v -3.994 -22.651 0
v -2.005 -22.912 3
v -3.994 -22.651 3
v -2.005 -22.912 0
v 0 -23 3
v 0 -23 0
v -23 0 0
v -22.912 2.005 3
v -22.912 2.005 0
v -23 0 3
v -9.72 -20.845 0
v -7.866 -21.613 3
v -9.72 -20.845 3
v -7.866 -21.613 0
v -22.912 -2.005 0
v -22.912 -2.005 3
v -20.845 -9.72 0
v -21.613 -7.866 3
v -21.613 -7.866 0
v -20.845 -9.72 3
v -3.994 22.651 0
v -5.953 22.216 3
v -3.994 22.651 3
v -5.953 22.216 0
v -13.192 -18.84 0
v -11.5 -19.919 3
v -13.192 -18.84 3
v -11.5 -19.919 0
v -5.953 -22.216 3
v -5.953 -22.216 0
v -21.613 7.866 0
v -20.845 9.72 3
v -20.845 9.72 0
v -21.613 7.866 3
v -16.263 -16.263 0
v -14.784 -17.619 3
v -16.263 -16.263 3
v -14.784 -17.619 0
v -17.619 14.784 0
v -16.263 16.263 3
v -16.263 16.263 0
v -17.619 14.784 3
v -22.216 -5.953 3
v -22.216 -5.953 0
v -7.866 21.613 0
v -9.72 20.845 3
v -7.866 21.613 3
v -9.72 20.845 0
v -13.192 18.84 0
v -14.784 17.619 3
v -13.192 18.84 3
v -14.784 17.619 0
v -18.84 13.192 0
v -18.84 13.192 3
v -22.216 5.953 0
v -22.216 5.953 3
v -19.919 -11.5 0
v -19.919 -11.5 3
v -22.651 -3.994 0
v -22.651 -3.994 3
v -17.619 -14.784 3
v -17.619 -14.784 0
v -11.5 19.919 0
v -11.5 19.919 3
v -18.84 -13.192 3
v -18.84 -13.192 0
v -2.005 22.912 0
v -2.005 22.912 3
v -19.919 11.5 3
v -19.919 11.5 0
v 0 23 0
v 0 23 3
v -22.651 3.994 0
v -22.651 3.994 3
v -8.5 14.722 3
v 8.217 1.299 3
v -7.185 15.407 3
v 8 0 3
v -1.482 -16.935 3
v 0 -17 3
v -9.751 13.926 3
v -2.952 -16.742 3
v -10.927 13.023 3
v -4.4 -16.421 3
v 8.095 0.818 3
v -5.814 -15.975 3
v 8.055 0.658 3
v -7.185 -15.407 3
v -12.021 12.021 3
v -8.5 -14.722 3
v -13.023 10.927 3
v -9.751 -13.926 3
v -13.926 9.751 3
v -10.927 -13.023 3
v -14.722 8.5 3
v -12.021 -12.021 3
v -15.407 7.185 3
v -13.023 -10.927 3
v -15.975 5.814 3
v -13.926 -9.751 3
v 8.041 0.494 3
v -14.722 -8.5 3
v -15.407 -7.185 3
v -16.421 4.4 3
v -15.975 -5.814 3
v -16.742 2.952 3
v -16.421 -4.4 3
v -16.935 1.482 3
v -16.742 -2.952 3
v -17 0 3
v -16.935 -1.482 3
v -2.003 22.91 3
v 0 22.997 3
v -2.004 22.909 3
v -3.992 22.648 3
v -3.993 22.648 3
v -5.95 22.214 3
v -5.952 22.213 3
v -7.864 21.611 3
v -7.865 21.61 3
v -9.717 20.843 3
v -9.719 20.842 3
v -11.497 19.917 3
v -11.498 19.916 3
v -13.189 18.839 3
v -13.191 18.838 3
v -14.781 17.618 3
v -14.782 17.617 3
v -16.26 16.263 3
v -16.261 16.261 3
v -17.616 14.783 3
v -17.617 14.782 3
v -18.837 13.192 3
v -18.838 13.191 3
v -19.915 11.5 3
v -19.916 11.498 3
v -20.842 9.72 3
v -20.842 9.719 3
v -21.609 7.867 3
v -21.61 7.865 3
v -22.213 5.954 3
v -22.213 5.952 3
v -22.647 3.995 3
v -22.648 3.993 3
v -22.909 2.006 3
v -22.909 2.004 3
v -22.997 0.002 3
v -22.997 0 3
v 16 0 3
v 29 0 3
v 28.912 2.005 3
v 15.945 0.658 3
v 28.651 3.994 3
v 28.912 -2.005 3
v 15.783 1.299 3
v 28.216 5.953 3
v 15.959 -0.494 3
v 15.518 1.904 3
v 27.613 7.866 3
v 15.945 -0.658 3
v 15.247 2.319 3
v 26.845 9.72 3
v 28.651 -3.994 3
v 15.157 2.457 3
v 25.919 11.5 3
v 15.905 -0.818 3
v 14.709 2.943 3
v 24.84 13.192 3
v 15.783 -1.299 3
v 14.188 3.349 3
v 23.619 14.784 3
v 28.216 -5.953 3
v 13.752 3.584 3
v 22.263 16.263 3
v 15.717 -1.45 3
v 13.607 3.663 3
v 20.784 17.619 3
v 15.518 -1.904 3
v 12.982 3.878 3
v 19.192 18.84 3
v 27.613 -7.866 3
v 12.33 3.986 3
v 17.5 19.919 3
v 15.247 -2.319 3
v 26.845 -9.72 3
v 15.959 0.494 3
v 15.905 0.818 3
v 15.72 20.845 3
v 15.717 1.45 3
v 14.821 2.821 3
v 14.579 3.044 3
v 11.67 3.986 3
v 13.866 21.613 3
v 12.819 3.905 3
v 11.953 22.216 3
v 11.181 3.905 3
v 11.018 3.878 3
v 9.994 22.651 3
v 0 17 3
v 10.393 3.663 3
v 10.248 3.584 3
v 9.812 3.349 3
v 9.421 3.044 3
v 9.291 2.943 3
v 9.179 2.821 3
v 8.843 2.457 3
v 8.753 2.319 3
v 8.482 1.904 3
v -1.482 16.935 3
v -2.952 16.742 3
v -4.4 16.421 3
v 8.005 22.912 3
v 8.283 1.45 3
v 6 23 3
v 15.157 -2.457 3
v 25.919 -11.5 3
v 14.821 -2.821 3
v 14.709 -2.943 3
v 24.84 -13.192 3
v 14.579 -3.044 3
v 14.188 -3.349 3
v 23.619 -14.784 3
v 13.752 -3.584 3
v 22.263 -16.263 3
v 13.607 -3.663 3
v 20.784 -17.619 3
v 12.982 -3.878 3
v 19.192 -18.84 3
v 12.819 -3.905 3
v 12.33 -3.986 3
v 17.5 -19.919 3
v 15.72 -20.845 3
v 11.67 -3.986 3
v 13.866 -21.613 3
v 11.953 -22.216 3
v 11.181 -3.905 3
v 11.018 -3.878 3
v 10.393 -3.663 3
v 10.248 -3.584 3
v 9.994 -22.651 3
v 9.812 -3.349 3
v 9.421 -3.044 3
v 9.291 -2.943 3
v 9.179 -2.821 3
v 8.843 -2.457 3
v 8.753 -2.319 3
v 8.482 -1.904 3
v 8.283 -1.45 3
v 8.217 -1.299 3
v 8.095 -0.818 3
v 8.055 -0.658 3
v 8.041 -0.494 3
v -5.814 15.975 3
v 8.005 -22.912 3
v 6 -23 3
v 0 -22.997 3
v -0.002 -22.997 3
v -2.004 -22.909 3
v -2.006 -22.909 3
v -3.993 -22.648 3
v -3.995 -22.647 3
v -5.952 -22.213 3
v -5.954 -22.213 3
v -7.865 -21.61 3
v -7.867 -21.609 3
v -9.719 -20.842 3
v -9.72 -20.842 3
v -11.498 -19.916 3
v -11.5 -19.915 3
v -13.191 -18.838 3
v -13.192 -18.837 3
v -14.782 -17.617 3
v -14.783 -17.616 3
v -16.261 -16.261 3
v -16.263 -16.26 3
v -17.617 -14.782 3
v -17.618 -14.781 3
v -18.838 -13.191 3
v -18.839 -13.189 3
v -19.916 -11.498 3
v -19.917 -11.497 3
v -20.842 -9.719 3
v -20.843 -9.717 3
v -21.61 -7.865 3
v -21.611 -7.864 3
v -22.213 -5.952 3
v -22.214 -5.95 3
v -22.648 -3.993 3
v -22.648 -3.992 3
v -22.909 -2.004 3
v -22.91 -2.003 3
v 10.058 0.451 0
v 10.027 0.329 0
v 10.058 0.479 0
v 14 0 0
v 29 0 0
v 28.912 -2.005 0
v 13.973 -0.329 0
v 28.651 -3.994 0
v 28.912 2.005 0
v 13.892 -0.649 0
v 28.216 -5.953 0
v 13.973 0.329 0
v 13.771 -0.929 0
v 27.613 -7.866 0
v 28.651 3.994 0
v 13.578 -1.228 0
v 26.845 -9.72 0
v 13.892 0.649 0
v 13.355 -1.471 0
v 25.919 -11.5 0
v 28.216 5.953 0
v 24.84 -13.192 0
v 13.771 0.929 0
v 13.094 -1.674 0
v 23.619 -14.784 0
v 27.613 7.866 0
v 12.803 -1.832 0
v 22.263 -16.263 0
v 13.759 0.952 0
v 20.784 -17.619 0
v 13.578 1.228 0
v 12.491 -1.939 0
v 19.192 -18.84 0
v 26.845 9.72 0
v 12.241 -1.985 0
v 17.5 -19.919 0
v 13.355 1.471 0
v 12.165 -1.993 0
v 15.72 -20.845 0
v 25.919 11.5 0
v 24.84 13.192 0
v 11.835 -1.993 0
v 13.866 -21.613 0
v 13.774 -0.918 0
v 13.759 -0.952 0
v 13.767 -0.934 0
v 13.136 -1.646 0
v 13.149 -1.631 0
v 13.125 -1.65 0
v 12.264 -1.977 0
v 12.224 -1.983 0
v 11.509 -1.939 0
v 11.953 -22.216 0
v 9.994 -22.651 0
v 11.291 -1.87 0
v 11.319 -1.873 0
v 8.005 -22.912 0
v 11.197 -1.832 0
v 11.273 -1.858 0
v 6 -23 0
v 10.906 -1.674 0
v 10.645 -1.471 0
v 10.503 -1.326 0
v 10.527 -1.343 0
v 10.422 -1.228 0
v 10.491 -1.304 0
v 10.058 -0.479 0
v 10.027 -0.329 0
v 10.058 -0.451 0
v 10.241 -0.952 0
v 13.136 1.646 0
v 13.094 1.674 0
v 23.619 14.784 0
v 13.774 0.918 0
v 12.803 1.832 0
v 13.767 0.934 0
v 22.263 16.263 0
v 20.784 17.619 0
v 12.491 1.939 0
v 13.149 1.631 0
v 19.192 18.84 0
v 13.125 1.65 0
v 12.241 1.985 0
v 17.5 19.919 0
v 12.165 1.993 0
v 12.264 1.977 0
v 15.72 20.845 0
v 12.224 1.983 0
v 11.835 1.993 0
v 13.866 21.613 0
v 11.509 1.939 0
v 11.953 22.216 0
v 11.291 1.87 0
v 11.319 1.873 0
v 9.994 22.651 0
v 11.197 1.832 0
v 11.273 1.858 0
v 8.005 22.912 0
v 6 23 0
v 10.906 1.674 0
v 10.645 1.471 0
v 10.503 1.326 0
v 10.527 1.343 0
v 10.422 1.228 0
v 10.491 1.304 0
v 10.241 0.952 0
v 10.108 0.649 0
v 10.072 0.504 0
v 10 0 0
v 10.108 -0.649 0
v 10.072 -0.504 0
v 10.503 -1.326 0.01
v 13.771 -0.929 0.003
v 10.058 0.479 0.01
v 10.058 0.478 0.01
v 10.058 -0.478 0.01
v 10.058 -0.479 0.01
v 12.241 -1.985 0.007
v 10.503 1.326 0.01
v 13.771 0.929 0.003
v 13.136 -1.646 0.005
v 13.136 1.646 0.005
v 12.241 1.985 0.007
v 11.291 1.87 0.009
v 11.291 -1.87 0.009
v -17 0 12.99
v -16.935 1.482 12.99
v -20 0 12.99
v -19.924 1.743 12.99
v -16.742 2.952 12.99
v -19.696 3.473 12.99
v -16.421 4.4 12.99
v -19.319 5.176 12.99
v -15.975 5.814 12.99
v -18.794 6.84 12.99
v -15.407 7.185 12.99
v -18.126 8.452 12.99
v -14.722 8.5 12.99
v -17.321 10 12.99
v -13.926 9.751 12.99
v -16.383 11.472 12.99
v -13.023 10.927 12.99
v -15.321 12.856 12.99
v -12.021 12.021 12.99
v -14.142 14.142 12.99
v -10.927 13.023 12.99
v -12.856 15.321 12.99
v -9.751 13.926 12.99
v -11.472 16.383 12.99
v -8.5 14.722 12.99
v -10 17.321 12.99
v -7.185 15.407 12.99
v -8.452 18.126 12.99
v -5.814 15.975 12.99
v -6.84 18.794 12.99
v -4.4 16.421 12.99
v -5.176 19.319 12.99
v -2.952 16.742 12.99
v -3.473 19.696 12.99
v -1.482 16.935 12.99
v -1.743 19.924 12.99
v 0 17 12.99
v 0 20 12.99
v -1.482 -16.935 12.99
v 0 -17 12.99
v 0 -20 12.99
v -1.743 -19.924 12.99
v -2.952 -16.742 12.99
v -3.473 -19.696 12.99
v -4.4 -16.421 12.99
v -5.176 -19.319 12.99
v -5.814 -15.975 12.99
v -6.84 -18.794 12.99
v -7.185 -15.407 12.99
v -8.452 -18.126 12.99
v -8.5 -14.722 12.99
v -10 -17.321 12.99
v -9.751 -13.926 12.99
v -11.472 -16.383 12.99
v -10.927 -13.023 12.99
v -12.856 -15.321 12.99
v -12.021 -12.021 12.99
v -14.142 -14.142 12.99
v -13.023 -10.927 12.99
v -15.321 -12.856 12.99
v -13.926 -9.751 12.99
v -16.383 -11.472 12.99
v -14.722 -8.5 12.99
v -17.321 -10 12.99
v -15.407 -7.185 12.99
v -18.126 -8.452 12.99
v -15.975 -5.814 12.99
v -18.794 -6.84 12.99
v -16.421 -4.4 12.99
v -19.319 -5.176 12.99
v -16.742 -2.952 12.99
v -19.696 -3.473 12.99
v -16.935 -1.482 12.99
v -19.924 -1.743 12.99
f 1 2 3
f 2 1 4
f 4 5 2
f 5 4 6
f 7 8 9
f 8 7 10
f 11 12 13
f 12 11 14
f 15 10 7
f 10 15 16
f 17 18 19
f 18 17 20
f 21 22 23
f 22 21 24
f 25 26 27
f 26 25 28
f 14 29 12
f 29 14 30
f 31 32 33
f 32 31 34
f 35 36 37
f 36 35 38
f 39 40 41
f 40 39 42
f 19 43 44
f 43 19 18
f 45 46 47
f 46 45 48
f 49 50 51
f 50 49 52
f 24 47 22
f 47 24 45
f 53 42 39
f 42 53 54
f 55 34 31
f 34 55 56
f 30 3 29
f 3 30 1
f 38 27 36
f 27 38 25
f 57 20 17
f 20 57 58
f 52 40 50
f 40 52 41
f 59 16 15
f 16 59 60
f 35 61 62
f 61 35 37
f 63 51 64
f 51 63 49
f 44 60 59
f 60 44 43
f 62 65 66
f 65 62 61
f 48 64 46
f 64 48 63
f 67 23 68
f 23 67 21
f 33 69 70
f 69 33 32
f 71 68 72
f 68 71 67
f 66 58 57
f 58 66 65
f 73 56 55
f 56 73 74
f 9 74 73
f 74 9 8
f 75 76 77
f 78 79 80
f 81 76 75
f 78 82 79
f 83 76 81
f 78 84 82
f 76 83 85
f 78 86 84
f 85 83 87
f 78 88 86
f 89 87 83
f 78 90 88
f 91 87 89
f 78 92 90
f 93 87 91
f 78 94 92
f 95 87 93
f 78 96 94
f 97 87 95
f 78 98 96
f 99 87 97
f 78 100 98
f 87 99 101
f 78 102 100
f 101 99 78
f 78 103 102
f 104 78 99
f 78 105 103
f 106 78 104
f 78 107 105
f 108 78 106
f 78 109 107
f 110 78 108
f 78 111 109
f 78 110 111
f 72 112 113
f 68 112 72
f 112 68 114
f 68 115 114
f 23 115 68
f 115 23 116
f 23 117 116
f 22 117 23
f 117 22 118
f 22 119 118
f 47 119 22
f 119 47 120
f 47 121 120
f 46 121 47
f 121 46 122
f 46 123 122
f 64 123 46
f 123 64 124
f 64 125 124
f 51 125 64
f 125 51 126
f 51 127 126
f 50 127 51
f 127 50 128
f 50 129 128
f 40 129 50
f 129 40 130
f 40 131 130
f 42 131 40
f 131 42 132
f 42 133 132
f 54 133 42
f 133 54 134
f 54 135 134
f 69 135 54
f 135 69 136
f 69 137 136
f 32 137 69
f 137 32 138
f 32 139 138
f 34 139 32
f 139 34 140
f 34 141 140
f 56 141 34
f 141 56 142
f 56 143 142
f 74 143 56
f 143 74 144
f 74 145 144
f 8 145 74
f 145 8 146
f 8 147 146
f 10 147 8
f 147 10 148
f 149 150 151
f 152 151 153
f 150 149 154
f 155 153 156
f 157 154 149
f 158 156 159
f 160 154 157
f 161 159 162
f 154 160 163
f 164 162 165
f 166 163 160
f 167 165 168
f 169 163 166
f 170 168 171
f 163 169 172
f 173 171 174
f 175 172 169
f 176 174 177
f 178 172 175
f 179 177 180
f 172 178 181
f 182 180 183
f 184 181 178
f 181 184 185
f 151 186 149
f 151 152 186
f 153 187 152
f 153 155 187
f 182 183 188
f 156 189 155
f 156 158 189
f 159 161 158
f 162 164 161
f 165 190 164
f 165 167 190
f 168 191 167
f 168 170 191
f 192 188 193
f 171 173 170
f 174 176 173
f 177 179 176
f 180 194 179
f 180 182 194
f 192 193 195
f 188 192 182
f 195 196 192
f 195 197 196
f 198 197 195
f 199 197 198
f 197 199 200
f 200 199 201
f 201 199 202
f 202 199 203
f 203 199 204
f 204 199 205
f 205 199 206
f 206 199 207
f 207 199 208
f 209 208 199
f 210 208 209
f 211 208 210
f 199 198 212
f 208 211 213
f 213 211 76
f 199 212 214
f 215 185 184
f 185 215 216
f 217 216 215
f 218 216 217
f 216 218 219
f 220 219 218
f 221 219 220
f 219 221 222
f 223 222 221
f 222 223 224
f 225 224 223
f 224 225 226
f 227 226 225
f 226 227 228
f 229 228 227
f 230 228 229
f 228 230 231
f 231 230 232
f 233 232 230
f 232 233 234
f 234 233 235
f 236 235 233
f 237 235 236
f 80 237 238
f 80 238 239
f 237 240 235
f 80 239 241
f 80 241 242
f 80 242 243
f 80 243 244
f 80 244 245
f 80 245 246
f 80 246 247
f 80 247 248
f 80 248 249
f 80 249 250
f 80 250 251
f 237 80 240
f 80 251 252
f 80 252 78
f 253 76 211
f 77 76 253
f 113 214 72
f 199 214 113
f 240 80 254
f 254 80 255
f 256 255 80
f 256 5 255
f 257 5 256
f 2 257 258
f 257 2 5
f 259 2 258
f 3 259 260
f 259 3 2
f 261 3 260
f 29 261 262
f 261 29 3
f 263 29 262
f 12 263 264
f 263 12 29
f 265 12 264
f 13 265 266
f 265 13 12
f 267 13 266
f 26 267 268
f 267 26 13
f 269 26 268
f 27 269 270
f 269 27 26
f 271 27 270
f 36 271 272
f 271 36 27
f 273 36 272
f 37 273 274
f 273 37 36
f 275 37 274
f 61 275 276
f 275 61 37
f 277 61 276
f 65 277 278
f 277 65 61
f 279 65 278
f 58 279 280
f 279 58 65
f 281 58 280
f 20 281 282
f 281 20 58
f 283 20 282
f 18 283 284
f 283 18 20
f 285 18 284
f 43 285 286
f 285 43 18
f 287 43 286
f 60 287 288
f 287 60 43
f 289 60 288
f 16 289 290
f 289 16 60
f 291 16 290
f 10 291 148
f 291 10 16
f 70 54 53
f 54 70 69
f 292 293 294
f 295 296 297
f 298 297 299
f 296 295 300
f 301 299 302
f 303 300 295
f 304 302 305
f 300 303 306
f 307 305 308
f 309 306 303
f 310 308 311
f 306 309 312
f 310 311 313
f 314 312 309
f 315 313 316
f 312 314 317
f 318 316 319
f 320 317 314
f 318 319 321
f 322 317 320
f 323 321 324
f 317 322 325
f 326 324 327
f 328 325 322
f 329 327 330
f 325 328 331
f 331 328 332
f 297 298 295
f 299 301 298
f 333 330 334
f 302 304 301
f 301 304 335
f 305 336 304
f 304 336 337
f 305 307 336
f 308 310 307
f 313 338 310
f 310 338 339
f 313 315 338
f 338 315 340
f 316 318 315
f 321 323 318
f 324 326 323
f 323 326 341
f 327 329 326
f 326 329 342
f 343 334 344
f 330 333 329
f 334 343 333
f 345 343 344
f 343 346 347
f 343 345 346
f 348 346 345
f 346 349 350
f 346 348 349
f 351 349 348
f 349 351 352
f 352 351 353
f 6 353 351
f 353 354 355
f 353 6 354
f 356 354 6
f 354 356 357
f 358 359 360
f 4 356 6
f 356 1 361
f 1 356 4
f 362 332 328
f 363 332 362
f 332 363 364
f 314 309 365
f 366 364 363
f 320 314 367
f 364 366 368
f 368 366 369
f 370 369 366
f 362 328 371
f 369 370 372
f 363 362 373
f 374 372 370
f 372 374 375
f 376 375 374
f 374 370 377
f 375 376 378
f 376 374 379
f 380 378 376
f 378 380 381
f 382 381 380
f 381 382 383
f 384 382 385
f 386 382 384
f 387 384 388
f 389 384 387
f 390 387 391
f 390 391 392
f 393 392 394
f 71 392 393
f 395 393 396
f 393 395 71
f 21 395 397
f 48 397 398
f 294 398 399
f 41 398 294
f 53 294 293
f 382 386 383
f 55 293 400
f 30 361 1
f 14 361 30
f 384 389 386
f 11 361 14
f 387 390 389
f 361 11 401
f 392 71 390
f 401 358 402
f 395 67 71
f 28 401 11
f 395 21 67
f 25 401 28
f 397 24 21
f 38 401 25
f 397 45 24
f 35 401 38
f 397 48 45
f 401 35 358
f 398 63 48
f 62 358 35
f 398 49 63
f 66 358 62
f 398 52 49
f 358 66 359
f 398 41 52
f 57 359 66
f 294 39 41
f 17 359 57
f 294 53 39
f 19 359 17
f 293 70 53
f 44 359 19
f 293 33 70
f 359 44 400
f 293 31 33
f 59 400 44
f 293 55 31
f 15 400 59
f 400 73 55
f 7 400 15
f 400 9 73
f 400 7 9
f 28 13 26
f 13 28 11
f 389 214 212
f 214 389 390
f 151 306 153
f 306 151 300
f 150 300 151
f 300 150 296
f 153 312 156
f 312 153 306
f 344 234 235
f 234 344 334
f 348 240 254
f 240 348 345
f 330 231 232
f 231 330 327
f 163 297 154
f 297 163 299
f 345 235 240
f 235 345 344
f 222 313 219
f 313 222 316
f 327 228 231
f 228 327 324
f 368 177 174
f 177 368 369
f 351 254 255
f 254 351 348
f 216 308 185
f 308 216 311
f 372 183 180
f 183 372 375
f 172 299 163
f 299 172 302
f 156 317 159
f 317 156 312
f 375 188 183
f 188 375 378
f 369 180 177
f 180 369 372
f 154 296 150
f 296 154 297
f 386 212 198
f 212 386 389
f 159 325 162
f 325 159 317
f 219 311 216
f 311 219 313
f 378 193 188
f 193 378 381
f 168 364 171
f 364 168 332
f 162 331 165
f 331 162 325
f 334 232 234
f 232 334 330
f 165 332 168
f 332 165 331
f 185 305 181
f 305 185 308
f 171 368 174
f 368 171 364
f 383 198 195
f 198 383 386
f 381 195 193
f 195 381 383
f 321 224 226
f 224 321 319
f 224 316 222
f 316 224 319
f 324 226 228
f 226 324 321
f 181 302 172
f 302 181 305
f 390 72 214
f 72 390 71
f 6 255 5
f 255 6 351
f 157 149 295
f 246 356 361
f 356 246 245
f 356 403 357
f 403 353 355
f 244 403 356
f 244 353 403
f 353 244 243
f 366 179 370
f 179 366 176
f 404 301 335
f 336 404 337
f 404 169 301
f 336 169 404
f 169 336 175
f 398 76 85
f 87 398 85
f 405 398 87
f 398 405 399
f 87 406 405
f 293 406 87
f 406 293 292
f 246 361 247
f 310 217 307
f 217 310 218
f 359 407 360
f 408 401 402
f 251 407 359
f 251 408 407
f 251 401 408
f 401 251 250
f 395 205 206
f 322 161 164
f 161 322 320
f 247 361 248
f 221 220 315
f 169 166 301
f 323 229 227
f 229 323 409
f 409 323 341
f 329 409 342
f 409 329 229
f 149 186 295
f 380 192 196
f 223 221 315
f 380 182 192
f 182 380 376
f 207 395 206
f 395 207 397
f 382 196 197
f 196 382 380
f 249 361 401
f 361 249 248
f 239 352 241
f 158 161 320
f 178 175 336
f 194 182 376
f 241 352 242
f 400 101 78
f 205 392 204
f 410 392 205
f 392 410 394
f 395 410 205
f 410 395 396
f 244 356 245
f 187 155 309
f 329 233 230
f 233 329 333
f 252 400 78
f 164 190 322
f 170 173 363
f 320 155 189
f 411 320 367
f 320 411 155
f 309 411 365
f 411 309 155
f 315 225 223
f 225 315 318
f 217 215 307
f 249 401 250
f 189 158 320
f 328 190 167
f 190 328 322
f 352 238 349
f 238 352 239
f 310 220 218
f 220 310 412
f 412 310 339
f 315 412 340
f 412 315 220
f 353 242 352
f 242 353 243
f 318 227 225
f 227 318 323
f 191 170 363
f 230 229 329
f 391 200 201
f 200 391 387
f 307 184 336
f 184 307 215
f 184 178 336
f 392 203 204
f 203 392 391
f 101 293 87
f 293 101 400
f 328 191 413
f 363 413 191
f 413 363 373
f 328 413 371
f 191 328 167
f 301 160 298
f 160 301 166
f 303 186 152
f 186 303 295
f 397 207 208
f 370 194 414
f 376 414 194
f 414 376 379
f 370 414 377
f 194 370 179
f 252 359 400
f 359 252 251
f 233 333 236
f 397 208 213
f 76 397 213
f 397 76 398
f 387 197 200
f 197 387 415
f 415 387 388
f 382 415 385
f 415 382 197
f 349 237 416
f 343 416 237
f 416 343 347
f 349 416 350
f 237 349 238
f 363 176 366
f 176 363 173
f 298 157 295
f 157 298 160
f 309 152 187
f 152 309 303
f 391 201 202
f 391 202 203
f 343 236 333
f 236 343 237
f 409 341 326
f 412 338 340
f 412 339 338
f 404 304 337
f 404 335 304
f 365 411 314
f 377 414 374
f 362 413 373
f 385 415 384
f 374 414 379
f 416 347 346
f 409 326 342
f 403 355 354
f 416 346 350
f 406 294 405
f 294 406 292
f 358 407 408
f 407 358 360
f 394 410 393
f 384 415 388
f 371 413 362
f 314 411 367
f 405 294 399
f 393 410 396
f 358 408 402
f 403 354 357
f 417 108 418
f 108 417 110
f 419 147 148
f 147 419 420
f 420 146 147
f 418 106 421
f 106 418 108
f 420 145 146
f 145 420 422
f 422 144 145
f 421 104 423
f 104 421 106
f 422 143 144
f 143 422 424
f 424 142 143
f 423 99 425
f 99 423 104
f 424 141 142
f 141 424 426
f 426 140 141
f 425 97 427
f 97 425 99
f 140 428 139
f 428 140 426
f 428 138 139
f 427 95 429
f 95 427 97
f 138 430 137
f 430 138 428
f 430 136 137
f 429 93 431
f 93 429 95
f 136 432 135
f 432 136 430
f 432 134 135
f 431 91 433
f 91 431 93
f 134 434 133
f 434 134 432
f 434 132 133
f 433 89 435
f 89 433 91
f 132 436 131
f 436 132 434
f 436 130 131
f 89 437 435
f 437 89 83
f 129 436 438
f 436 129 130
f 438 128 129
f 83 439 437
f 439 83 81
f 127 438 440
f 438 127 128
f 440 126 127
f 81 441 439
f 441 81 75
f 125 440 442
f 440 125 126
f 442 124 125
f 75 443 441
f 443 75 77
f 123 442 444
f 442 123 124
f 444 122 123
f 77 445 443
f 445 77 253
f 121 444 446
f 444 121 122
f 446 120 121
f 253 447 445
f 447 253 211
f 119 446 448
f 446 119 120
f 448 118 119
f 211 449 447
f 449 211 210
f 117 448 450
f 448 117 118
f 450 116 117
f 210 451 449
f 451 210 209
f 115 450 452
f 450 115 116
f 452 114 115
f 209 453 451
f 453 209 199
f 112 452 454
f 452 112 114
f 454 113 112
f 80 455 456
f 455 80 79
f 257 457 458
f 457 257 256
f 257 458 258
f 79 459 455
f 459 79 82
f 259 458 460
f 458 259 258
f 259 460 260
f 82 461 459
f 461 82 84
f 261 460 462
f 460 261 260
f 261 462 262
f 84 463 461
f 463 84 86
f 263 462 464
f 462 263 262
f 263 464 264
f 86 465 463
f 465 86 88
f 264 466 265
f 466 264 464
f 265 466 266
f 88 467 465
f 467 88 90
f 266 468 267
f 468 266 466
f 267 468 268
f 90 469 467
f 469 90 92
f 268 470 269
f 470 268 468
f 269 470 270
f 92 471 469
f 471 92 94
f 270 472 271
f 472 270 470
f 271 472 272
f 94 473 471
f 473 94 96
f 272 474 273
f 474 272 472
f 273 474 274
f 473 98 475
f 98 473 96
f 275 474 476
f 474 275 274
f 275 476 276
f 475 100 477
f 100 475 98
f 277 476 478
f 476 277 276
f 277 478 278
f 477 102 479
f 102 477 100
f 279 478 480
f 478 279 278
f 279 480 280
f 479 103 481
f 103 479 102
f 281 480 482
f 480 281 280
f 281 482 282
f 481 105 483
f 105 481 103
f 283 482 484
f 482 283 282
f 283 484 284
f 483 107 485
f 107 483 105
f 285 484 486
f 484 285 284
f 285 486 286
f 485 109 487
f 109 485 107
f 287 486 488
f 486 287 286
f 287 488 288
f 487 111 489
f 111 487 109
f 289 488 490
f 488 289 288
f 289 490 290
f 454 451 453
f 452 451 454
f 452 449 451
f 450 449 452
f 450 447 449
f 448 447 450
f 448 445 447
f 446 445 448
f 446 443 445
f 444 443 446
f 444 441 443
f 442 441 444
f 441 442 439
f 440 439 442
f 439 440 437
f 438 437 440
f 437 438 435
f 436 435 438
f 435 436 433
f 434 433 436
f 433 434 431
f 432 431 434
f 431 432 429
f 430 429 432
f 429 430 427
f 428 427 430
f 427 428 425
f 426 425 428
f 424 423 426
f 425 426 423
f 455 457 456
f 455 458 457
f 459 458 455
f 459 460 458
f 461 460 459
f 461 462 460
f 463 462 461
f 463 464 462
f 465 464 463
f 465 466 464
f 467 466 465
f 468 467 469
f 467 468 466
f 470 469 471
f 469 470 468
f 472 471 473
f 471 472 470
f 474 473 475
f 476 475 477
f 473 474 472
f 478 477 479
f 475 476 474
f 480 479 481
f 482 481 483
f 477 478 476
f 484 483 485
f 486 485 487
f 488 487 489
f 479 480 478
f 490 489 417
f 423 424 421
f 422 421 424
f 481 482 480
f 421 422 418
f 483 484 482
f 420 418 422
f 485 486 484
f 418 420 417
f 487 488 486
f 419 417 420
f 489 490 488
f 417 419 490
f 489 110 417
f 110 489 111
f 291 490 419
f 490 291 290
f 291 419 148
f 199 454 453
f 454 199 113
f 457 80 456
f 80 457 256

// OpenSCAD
/* [General] */

// Thickness of bar (add some tolerance)
bar_thickness = 34; // [5:30]
// back thickness of holder around bar
holder_bottom_thickness = 6; // [5:20]
// front thickness of holder around bar
holder_top_thickness = 3; // [0:20]
// thickness of base plate
base_thickness = 3; // [2:5]

/* [Plug] */

plug_depth = 7;
plug_thickness = 4;
// distance inbetween plugs
plug_distance = 25;
// offset location from vertical center
plugs_offset = -15;

/* [Hidden] */

// slight overlap / fudge factor
o = 0.01;
// distance between parts on plate
distance = 6;
bar_radius = bar_thickness/2;
plug_radius = plug_thickness/2;
base_width = bar_thickness+holder_bottom_thickness*2;
base_height = base_width;
$fa = 5;
$fs = 1;
// from https://github.com/elmom/MCAD/blob/master/boxes.scad
include <MCAD/boxes.scad>

base();
translate([0,0,base_thickness-o]) holder();

// this is the piece that sticks out to holds the bar
// we will be extruding this
module wall_mold() {
  polygon(points=[[0,0],[0,10],[holder_top_thickness,10],[holder_bottom_thickness,0]]);
}
module holder() {
  difference()
  {
    // this is a circle extrusion of the wall_mold()
    rotate_extrude(convexity = 10) translate([bar_radius, 0, 0]) wall_mold();
    // we only want the bottom 1/2 so lets take take away the top half
    translate([base_width/2,0,15/2-0.1]) cube([base_width,base_width,15],center=true);
  }
}
module base() {
  difference()
  {
     translate([3,0,base_thickness/2]) roundedBox([base_height + 6, base_width, base_thickness], base_width/2, true);
     translate([plugs_offset,0,0]) {
      //
      rotate([180,0,0]) translate([0,0,-base_thickness]) {
        translate([plug_distance+plug_radius,0,0]) plug(true);
      }
    }
  }
}
module plug(remove=false) {
  if(remove) {
    translate([0,0,-base_thickness]) cylinder(base_thickness*2,plug_radius*3,plug_radius);
  } else {
    cylinder(base_thickness,plug_radius*2,plug_radius);
  }
  translate([0,0,base_thickness-o])
    cylinder(plug_depth+o,plug_radius,plug_radius);
}
